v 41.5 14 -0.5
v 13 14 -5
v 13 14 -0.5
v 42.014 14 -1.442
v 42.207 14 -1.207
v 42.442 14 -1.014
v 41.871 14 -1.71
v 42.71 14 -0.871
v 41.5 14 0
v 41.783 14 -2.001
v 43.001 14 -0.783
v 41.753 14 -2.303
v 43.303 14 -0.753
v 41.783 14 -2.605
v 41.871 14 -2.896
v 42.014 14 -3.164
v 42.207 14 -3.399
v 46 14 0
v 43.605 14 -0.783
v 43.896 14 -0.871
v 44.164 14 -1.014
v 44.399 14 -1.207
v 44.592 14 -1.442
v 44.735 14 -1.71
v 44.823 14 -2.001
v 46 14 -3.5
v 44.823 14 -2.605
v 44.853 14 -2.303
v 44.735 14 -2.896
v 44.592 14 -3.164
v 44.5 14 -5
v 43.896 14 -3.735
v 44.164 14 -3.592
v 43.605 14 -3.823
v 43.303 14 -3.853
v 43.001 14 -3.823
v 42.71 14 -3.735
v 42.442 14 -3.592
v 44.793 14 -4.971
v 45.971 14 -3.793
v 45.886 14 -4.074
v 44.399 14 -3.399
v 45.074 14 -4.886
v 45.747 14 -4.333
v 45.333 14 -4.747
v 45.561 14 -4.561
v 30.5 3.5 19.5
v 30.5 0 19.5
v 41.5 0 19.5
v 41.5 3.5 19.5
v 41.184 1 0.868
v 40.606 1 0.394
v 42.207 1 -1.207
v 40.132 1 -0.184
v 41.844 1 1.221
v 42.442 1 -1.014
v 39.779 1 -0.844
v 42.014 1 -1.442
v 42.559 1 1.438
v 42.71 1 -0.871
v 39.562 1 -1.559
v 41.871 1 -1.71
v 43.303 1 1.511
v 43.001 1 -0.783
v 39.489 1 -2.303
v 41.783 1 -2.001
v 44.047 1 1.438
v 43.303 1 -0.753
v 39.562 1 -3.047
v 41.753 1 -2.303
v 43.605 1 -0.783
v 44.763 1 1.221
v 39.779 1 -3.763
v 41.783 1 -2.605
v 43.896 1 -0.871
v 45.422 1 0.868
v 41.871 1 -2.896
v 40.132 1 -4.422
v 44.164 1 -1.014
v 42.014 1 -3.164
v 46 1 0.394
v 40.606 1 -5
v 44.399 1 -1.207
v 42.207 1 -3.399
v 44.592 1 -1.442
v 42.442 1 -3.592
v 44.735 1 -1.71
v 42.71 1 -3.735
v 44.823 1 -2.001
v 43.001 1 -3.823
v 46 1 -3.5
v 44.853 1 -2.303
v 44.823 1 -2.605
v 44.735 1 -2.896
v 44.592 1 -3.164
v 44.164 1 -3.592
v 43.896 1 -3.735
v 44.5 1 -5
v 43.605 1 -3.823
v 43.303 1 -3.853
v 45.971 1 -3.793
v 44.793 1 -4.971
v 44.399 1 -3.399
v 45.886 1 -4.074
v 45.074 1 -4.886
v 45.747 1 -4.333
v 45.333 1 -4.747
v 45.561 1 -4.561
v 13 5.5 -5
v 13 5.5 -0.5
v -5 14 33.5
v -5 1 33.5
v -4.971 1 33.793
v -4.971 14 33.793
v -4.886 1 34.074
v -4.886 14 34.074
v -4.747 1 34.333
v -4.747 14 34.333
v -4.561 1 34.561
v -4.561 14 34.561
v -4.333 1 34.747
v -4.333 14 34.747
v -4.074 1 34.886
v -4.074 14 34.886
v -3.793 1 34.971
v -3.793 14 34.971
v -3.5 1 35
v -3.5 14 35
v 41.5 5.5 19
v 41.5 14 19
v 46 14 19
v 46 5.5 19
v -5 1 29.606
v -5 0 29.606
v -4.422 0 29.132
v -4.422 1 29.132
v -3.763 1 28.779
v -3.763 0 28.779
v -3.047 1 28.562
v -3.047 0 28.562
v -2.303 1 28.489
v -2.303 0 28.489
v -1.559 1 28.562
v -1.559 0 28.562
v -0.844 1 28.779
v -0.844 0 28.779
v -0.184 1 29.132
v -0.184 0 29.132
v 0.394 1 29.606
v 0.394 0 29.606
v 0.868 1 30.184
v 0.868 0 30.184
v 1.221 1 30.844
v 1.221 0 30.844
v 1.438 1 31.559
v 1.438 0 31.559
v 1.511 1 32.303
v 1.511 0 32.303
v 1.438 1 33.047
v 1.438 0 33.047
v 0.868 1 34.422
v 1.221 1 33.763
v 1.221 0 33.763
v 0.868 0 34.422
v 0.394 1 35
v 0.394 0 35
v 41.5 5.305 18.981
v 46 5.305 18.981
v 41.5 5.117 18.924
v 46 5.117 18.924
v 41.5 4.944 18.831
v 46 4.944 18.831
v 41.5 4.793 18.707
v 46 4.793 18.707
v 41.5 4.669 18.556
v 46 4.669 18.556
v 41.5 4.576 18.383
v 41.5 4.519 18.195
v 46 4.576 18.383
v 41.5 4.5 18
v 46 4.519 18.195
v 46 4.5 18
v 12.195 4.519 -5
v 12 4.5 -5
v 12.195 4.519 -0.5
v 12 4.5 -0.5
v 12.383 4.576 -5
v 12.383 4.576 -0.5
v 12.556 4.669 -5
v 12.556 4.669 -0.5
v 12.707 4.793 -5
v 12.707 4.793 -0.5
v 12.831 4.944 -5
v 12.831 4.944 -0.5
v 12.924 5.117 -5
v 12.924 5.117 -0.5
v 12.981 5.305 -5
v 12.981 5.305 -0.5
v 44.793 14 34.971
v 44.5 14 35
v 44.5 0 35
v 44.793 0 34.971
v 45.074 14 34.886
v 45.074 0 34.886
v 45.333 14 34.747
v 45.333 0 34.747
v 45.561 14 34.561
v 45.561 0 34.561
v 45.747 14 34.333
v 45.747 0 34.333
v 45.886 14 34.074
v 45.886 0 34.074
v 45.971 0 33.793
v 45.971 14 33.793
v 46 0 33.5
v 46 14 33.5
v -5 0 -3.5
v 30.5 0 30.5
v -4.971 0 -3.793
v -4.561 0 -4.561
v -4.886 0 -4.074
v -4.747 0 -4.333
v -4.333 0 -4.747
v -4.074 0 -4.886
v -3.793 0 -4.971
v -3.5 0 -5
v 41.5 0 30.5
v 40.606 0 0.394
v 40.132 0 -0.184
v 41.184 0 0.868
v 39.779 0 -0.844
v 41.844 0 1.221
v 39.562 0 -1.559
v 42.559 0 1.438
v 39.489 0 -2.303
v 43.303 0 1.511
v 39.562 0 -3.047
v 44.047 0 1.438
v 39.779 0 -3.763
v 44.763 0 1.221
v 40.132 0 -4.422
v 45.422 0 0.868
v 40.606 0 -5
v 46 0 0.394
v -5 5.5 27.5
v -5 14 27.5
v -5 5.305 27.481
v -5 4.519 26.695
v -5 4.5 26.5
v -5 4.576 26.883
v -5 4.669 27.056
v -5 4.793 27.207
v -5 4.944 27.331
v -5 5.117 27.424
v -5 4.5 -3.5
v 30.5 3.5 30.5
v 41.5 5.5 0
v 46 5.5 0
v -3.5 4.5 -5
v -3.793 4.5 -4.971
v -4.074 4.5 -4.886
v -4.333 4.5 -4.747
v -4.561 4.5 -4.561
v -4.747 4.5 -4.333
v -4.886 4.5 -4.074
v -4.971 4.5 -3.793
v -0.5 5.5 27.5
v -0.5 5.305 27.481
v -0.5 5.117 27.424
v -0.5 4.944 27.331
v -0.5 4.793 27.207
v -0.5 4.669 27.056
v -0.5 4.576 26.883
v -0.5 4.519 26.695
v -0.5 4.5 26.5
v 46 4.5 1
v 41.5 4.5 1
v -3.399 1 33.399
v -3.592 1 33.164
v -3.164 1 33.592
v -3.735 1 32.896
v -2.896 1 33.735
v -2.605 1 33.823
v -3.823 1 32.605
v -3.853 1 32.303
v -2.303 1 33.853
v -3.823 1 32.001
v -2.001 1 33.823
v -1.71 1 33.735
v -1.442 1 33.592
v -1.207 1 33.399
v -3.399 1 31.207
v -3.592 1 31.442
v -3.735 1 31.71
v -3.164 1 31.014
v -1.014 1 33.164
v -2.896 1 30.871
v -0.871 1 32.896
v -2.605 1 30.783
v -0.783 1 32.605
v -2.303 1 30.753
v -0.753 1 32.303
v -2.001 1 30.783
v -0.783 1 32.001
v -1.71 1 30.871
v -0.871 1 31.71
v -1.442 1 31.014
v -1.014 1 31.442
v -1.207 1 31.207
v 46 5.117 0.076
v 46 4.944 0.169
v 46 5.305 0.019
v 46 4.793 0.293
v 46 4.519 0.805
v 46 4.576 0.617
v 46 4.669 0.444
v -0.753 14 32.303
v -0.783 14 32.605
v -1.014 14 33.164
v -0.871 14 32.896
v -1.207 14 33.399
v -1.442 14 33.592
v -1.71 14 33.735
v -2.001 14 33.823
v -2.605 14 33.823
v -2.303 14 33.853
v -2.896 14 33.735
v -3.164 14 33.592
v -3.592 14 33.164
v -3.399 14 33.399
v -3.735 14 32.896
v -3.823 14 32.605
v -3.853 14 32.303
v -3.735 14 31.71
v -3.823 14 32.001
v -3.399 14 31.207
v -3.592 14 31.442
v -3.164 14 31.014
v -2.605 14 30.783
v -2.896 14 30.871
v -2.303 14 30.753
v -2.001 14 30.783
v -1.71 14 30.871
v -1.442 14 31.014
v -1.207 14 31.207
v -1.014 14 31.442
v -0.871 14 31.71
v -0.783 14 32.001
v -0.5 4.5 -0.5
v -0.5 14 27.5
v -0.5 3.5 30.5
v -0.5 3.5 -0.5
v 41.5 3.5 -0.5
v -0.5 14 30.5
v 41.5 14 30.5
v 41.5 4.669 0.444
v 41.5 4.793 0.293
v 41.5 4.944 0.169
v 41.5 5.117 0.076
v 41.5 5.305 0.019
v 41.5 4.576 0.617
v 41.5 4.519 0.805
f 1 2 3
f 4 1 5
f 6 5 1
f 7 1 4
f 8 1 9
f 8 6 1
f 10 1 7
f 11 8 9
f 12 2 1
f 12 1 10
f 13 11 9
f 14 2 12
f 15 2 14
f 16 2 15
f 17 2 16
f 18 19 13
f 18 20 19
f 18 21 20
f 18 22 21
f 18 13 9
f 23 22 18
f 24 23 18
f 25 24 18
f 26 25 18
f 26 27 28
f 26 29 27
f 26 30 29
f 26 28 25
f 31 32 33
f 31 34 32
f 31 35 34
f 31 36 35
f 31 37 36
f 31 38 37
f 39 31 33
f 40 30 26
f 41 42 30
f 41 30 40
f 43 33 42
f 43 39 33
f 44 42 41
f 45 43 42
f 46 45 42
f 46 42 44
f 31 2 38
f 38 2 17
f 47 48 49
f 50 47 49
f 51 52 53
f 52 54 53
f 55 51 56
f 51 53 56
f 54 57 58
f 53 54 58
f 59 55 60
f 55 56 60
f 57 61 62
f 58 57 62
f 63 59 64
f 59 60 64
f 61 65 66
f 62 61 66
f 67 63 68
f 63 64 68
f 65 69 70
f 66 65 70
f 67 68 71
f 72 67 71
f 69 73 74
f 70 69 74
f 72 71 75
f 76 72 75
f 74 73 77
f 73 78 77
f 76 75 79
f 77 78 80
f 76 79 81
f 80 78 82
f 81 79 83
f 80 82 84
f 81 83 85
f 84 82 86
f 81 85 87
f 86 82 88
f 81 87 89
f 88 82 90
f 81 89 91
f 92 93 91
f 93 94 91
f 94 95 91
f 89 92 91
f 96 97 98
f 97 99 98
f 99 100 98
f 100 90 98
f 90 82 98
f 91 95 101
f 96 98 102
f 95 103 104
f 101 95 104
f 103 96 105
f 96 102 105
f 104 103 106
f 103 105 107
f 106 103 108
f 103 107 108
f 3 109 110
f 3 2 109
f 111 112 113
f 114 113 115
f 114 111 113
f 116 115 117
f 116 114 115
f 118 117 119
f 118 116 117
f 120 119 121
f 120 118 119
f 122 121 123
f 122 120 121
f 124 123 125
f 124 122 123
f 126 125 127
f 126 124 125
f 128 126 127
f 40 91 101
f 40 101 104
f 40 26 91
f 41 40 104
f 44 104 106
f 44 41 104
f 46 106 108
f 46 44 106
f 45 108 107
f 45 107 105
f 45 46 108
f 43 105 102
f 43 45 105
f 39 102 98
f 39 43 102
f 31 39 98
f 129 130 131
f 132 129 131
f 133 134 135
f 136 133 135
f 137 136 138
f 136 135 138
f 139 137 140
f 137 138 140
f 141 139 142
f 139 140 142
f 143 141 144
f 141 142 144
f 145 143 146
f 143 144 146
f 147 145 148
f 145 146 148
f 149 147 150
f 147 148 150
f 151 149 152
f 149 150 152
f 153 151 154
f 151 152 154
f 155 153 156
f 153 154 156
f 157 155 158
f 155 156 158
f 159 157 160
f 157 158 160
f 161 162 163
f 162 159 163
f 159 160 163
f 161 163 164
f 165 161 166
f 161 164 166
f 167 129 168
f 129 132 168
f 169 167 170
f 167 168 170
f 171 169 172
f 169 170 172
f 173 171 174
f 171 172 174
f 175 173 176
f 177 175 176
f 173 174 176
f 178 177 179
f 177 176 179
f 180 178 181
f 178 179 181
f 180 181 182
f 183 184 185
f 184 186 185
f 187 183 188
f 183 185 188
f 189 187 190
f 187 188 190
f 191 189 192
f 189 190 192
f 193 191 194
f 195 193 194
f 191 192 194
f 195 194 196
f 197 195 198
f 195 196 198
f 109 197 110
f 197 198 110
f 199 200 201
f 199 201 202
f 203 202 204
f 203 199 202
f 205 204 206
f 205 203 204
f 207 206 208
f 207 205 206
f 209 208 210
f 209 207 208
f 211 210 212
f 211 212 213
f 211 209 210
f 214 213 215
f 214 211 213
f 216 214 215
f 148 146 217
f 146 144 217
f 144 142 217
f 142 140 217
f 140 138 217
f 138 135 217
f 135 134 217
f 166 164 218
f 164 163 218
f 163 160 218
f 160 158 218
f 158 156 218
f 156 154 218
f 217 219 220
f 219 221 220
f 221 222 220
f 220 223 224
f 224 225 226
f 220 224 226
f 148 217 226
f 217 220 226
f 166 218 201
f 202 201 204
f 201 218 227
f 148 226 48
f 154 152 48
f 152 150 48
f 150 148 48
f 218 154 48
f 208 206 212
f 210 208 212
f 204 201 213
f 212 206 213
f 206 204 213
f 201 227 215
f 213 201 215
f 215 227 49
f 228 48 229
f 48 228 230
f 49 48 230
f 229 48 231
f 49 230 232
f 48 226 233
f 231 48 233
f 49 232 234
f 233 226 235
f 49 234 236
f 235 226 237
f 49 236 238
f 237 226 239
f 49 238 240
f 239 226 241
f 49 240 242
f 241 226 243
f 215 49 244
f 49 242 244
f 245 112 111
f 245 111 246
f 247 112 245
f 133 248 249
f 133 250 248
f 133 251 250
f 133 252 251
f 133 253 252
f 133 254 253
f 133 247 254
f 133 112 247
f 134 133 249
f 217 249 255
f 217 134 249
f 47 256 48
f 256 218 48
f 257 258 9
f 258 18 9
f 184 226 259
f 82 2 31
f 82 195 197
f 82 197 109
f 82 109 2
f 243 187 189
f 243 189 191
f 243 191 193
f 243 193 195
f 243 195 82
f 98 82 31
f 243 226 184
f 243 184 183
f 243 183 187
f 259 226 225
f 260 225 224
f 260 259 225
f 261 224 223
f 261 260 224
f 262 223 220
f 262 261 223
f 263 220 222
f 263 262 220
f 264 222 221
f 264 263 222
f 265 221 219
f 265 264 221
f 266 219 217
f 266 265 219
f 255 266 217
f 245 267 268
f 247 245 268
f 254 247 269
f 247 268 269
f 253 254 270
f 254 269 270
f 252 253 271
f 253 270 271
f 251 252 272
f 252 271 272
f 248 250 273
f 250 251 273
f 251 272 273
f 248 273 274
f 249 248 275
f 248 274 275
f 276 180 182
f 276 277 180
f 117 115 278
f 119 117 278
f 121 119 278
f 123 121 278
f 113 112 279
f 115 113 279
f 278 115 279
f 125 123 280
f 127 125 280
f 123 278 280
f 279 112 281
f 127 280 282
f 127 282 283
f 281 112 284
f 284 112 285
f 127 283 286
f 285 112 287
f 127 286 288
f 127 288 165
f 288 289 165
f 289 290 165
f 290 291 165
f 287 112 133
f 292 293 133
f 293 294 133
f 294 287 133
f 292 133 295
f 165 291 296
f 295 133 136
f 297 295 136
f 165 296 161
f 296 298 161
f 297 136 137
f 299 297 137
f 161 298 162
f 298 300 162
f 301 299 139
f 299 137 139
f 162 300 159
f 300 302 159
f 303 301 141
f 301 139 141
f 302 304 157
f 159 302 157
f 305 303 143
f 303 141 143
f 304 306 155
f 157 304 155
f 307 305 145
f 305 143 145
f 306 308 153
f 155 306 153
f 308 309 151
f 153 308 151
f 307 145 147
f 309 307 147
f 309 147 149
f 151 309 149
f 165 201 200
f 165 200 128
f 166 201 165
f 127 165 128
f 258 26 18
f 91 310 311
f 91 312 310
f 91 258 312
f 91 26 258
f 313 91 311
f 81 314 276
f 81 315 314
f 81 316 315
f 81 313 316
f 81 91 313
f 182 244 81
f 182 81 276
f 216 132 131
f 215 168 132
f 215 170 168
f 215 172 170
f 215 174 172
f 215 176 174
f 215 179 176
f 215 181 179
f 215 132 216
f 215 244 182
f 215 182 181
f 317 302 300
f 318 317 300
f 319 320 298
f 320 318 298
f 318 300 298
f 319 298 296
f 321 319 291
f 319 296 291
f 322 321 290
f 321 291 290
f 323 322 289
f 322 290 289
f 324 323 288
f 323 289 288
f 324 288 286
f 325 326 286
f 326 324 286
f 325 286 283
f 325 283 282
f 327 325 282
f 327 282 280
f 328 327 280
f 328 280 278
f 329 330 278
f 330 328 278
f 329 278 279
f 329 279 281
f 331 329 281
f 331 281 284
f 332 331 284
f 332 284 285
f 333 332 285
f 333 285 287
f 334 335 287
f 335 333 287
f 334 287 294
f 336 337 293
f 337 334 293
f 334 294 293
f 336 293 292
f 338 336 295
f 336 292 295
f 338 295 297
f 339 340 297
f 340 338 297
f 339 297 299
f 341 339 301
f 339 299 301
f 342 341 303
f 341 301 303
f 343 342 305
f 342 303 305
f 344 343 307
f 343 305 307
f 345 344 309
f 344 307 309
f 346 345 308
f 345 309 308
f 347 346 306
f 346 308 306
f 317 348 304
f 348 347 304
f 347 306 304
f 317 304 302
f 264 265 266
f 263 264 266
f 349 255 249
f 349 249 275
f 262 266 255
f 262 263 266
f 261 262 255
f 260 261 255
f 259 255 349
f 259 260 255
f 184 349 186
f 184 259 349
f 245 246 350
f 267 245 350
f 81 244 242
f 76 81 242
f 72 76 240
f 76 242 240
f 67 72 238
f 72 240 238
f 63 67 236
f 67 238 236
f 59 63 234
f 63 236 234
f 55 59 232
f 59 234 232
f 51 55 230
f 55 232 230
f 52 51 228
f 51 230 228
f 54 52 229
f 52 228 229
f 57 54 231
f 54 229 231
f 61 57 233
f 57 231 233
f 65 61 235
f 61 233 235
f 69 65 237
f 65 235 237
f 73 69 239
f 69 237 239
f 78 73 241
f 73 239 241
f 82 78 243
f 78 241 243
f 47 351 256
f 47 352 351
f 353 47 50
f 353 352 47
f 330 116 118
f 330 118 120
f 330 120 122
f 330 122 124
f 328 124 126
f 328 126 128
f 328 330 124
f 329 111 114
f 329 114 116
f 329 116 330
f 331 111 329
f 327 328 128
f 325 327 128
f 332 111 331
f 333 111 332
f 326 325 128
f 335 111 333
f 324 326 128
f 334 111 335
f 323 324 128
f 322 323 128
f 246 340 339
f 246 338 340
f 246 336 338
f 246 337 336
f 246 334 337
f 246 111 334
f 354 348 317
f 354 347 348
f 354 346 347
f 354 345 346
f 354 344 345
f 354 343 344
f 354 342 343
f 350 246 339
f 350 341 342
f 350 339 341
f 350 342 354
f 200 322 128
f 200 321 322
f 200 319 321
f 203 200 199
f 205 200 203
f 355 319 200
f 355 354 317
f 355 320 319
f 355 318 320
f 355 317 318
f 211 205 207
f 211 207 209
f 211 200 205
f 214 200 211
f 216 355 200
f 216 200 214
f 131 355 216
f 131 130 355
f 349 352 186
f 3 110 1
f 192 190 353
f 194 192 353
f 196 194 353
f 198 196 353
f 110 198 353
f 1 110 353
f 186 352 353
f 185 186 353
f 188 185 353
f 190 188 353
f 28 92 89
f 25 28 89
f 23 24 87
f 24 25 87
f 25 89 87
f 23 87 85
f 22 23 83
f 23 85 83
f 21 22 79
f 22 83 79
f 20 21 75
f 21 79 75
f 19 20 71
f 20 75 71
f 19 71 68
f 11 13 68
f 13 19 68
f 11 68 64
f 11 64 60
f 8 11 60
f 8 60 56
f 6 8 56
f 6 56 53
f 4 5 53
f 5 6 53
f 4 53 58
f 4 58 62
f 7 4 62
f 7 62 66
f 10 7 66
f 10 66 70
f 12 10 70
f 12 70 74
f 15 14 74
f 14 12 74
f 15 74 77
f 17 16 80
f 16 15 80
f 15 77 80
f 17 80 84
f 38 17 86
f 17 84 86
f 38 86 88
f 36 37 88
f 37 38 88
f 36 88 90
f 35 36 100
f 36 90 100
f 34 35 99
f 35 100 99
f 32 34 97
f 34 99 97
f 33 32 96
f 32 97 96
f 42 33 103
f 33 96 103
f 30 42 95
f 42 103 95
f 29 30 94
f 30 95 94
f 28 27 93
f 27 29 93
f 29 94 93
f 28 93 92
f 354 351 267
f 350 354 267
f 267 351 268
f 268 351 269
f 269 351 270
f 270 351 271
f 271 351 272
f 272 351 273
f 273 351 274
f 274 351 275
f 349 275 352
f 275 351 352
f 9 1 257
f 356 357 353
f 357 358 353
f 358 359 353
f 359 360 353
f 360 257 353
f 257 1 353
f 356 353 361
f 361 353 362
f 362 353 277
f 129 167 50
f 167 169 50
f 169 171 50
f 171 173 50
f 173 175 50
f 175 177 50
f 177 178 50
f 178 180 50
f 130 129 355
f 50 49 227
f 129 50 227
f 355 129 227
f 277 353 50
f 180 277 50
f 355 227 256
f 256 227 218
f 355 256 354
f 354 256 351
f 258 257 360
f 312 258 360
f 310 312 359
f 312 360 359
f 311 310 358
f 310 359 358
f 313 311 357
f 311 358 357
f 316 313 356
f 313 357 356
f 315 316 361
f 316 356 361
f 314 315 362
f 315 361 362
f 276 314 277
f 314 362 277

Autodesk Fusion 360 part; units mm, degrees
sketch "Sketch1" plane through (0, 0, 0) normal (0, 1, 0) x (1, 0, 0)
  line L0 (0, 0) -> (41, 0) construction
  line L1 (41, 0) -> (41, -30) construction
  line L2 (41, -30) -> (0, -30) construction
  line L3 (0, -30) -> (0, 0) construction
  line L4 (-0.5, 0.5) -> (41.5, 0.5)
  line L5 (41.5, 0.5) -> (41.5, -30.5)
  line L6 (41.5, -30.5) -> (-0.5, -30.5)
  line L7 (-0.5, -30.5) -> (-0.5, 0.5)
  line L8 (-5, 5) -> (46, 5)
  line L9 (46, 5) -> (46, -35)
  line L10 (46, -35) -> (-5, -35)
  line L11 (-5, -35) -> (-5, 5)
  line L12 (30.5, -30.5) -> (30.5, -19.5)
  line L13 (30.5, -19.5) -> (41.5, -19.5)
  circle A0 centre (43.3031, 2.3031) radius 1.55
  circle A1 centre (-2.3031, -32.3031) radius 1.55
  circle A2 centre (-2.3031, -32.3031) radius 3.814
  circle A3 centre (43.3031, 2.3031) radius 3.814
  dimension "d1" = 41
  dimension "d2" = 30
  dimension "d3" = -0.5
  dimension "d4" = -5
  dimension "d5" = 11
  dimension "d6" = 11
  dimension "d7" = 3.1
  dimension "d8" = 3.1
  dimension "d22" = 2.55
  dimension "d23" = 2.55
  dimension "d30" = 7.6279
  dimension "d32" = 3.814
  dimension "d33" = 7.6279
extrude "Extrude1" add sketch "Sketch1" along normal blind 3.5 contours L4 L5 L6 L7 L12 L13 A2 A3 | L4 L5 A3 | L6 L7 A2
extrude "Extrude2" add sketch "Sketch1" along normal blind 14 contours L4 L7 L8 L11 A2 A3 | L4 L5 L8 L9 A3 | L6 L7 L10 L11 A2 | L5 L6 L9 L10 A2 A3
fillet "Fillet1" radius 1.5 4 edges at (46, 7, -5) (46, 7, 35) (-5, 7, -5) (-5, 7, 35)
ref_plane "WorkPlane1" through (20.5, 14, 15) normal (0, 1, 0) x (1, 0, 0)
sketch "Sketch2" plane through (0, 14, 0) normal (0, 1, 0) x (1, 0, 0)
  line L0 (41, -30) -> (0, -30)
  line L1 (41, 0) -> (41, -30)
  line L2 (41.5, 0.5) -> (41.5, -30.5)
  line L3 (41.5, -30.5) -> (-0.5, -30.5)
  line L4 (0, -30) -> (0, 0)
  line L5 (-0.5, -30.5) -> (-0.5, 0.5)
  line L6 (0, 0) -> (41, 0)
  line L7 (-0.5, 0.5) -> (41.5, 0.5)
  line L8 (-5, 5) -> (46, 5)
  line L9 (46, 5) -> (46, -35)
  line L10 (-5, -35) -> (-5, 5)
  line L11 (46, -35) -> (-5, -35)
  circle A0 centre (43.3031, 2.3031) radius 1.55
  circle A1 centre (-2.3031, -32.3031) radius 1.55
  line L12 (46, 0) -> (41.5, 0)
  line L13 (41.5, 0) -> (41.5, -19)
  line L14 (41.5, -19) -> (46, -19)
  line L15 (46, -19) -> (46, 0)
  line L16 (-0.5, 0) -> (-5, 0)
  line L17 (-5, 0) -> (-5, -19)
  line L18 (-5, -19) -> (-0.5, -19)
  line L19 (-0.5, -19) -> (-0.5, 0)
  line L20 (-5, 5) -> (13, 5)
  line L21 (13, 5) -> (13, 0)
  line L22 (13, 0) -> (-5, 0)
  line L23 (-5, 0) -> (-5, 5)
  line L24 (-0.5, -30.5) -> (-5, -30.5)
  line L25 (-5, -30.5) -> (-5, -27.5)
  line L26 (-5, -27.5) -> (-0.5, -27.5)
  line L27 (-0.5, -27.5) -> (-0.5, -30.5)
  dimension "d16" = 19
  dimension "d17" = 19
  dimension "d18" = 18
  dimension "d19" = 5
  dimension "d28" = 34.6062
  dimension "d29" = 45.6062
  dimension "d36" = 3
extrude "Extrude3" cut sketch "Sketch2" against normal blind 9.5 contours L5 L7 L8 L10 L16 L20 L21 L22 L23 | L5 L10 L16 L17 L18 L19 L22 | L5 L10 L18 L26 | L2 L9 L12 L13 L14 L15
extrude "Extrude4" cut sketch "Sketch1" along normal blind 1 contours L4 L5 L8 L9 A3 | L4 L5 A3 | L6 L7 A2 | L6 L7 L10 L11 A2 | L8 A3 | L11 A2 | L9 A3 | L10 A2
fillet "Fillet3" radius 1 4 edges at (-2.75, 4.5, 27.5) (13, 4.5, -2.75) (43.75, 4.5, 19) (43.75, 4.5, 0)
equation "d6 = d5"
equation "d9 = TOTAL_HEIGHT - WIRE_HEIGHT - 1 mm"
equation "d11 = TOTAL_HEIGHT"
equation "d20 = -WIRE_HEIGHT"
equation "d22 = d7 / 2 + 1 mm"
equation "d23 = d8 / 2 + 1 mm"
equation "TOTAL_HEIGHT = 14 mm"
equation "WIRE_HEIGHT = 9.5 mm"
equation "d30 = d33"
equation "d33 = d32 * 2"
